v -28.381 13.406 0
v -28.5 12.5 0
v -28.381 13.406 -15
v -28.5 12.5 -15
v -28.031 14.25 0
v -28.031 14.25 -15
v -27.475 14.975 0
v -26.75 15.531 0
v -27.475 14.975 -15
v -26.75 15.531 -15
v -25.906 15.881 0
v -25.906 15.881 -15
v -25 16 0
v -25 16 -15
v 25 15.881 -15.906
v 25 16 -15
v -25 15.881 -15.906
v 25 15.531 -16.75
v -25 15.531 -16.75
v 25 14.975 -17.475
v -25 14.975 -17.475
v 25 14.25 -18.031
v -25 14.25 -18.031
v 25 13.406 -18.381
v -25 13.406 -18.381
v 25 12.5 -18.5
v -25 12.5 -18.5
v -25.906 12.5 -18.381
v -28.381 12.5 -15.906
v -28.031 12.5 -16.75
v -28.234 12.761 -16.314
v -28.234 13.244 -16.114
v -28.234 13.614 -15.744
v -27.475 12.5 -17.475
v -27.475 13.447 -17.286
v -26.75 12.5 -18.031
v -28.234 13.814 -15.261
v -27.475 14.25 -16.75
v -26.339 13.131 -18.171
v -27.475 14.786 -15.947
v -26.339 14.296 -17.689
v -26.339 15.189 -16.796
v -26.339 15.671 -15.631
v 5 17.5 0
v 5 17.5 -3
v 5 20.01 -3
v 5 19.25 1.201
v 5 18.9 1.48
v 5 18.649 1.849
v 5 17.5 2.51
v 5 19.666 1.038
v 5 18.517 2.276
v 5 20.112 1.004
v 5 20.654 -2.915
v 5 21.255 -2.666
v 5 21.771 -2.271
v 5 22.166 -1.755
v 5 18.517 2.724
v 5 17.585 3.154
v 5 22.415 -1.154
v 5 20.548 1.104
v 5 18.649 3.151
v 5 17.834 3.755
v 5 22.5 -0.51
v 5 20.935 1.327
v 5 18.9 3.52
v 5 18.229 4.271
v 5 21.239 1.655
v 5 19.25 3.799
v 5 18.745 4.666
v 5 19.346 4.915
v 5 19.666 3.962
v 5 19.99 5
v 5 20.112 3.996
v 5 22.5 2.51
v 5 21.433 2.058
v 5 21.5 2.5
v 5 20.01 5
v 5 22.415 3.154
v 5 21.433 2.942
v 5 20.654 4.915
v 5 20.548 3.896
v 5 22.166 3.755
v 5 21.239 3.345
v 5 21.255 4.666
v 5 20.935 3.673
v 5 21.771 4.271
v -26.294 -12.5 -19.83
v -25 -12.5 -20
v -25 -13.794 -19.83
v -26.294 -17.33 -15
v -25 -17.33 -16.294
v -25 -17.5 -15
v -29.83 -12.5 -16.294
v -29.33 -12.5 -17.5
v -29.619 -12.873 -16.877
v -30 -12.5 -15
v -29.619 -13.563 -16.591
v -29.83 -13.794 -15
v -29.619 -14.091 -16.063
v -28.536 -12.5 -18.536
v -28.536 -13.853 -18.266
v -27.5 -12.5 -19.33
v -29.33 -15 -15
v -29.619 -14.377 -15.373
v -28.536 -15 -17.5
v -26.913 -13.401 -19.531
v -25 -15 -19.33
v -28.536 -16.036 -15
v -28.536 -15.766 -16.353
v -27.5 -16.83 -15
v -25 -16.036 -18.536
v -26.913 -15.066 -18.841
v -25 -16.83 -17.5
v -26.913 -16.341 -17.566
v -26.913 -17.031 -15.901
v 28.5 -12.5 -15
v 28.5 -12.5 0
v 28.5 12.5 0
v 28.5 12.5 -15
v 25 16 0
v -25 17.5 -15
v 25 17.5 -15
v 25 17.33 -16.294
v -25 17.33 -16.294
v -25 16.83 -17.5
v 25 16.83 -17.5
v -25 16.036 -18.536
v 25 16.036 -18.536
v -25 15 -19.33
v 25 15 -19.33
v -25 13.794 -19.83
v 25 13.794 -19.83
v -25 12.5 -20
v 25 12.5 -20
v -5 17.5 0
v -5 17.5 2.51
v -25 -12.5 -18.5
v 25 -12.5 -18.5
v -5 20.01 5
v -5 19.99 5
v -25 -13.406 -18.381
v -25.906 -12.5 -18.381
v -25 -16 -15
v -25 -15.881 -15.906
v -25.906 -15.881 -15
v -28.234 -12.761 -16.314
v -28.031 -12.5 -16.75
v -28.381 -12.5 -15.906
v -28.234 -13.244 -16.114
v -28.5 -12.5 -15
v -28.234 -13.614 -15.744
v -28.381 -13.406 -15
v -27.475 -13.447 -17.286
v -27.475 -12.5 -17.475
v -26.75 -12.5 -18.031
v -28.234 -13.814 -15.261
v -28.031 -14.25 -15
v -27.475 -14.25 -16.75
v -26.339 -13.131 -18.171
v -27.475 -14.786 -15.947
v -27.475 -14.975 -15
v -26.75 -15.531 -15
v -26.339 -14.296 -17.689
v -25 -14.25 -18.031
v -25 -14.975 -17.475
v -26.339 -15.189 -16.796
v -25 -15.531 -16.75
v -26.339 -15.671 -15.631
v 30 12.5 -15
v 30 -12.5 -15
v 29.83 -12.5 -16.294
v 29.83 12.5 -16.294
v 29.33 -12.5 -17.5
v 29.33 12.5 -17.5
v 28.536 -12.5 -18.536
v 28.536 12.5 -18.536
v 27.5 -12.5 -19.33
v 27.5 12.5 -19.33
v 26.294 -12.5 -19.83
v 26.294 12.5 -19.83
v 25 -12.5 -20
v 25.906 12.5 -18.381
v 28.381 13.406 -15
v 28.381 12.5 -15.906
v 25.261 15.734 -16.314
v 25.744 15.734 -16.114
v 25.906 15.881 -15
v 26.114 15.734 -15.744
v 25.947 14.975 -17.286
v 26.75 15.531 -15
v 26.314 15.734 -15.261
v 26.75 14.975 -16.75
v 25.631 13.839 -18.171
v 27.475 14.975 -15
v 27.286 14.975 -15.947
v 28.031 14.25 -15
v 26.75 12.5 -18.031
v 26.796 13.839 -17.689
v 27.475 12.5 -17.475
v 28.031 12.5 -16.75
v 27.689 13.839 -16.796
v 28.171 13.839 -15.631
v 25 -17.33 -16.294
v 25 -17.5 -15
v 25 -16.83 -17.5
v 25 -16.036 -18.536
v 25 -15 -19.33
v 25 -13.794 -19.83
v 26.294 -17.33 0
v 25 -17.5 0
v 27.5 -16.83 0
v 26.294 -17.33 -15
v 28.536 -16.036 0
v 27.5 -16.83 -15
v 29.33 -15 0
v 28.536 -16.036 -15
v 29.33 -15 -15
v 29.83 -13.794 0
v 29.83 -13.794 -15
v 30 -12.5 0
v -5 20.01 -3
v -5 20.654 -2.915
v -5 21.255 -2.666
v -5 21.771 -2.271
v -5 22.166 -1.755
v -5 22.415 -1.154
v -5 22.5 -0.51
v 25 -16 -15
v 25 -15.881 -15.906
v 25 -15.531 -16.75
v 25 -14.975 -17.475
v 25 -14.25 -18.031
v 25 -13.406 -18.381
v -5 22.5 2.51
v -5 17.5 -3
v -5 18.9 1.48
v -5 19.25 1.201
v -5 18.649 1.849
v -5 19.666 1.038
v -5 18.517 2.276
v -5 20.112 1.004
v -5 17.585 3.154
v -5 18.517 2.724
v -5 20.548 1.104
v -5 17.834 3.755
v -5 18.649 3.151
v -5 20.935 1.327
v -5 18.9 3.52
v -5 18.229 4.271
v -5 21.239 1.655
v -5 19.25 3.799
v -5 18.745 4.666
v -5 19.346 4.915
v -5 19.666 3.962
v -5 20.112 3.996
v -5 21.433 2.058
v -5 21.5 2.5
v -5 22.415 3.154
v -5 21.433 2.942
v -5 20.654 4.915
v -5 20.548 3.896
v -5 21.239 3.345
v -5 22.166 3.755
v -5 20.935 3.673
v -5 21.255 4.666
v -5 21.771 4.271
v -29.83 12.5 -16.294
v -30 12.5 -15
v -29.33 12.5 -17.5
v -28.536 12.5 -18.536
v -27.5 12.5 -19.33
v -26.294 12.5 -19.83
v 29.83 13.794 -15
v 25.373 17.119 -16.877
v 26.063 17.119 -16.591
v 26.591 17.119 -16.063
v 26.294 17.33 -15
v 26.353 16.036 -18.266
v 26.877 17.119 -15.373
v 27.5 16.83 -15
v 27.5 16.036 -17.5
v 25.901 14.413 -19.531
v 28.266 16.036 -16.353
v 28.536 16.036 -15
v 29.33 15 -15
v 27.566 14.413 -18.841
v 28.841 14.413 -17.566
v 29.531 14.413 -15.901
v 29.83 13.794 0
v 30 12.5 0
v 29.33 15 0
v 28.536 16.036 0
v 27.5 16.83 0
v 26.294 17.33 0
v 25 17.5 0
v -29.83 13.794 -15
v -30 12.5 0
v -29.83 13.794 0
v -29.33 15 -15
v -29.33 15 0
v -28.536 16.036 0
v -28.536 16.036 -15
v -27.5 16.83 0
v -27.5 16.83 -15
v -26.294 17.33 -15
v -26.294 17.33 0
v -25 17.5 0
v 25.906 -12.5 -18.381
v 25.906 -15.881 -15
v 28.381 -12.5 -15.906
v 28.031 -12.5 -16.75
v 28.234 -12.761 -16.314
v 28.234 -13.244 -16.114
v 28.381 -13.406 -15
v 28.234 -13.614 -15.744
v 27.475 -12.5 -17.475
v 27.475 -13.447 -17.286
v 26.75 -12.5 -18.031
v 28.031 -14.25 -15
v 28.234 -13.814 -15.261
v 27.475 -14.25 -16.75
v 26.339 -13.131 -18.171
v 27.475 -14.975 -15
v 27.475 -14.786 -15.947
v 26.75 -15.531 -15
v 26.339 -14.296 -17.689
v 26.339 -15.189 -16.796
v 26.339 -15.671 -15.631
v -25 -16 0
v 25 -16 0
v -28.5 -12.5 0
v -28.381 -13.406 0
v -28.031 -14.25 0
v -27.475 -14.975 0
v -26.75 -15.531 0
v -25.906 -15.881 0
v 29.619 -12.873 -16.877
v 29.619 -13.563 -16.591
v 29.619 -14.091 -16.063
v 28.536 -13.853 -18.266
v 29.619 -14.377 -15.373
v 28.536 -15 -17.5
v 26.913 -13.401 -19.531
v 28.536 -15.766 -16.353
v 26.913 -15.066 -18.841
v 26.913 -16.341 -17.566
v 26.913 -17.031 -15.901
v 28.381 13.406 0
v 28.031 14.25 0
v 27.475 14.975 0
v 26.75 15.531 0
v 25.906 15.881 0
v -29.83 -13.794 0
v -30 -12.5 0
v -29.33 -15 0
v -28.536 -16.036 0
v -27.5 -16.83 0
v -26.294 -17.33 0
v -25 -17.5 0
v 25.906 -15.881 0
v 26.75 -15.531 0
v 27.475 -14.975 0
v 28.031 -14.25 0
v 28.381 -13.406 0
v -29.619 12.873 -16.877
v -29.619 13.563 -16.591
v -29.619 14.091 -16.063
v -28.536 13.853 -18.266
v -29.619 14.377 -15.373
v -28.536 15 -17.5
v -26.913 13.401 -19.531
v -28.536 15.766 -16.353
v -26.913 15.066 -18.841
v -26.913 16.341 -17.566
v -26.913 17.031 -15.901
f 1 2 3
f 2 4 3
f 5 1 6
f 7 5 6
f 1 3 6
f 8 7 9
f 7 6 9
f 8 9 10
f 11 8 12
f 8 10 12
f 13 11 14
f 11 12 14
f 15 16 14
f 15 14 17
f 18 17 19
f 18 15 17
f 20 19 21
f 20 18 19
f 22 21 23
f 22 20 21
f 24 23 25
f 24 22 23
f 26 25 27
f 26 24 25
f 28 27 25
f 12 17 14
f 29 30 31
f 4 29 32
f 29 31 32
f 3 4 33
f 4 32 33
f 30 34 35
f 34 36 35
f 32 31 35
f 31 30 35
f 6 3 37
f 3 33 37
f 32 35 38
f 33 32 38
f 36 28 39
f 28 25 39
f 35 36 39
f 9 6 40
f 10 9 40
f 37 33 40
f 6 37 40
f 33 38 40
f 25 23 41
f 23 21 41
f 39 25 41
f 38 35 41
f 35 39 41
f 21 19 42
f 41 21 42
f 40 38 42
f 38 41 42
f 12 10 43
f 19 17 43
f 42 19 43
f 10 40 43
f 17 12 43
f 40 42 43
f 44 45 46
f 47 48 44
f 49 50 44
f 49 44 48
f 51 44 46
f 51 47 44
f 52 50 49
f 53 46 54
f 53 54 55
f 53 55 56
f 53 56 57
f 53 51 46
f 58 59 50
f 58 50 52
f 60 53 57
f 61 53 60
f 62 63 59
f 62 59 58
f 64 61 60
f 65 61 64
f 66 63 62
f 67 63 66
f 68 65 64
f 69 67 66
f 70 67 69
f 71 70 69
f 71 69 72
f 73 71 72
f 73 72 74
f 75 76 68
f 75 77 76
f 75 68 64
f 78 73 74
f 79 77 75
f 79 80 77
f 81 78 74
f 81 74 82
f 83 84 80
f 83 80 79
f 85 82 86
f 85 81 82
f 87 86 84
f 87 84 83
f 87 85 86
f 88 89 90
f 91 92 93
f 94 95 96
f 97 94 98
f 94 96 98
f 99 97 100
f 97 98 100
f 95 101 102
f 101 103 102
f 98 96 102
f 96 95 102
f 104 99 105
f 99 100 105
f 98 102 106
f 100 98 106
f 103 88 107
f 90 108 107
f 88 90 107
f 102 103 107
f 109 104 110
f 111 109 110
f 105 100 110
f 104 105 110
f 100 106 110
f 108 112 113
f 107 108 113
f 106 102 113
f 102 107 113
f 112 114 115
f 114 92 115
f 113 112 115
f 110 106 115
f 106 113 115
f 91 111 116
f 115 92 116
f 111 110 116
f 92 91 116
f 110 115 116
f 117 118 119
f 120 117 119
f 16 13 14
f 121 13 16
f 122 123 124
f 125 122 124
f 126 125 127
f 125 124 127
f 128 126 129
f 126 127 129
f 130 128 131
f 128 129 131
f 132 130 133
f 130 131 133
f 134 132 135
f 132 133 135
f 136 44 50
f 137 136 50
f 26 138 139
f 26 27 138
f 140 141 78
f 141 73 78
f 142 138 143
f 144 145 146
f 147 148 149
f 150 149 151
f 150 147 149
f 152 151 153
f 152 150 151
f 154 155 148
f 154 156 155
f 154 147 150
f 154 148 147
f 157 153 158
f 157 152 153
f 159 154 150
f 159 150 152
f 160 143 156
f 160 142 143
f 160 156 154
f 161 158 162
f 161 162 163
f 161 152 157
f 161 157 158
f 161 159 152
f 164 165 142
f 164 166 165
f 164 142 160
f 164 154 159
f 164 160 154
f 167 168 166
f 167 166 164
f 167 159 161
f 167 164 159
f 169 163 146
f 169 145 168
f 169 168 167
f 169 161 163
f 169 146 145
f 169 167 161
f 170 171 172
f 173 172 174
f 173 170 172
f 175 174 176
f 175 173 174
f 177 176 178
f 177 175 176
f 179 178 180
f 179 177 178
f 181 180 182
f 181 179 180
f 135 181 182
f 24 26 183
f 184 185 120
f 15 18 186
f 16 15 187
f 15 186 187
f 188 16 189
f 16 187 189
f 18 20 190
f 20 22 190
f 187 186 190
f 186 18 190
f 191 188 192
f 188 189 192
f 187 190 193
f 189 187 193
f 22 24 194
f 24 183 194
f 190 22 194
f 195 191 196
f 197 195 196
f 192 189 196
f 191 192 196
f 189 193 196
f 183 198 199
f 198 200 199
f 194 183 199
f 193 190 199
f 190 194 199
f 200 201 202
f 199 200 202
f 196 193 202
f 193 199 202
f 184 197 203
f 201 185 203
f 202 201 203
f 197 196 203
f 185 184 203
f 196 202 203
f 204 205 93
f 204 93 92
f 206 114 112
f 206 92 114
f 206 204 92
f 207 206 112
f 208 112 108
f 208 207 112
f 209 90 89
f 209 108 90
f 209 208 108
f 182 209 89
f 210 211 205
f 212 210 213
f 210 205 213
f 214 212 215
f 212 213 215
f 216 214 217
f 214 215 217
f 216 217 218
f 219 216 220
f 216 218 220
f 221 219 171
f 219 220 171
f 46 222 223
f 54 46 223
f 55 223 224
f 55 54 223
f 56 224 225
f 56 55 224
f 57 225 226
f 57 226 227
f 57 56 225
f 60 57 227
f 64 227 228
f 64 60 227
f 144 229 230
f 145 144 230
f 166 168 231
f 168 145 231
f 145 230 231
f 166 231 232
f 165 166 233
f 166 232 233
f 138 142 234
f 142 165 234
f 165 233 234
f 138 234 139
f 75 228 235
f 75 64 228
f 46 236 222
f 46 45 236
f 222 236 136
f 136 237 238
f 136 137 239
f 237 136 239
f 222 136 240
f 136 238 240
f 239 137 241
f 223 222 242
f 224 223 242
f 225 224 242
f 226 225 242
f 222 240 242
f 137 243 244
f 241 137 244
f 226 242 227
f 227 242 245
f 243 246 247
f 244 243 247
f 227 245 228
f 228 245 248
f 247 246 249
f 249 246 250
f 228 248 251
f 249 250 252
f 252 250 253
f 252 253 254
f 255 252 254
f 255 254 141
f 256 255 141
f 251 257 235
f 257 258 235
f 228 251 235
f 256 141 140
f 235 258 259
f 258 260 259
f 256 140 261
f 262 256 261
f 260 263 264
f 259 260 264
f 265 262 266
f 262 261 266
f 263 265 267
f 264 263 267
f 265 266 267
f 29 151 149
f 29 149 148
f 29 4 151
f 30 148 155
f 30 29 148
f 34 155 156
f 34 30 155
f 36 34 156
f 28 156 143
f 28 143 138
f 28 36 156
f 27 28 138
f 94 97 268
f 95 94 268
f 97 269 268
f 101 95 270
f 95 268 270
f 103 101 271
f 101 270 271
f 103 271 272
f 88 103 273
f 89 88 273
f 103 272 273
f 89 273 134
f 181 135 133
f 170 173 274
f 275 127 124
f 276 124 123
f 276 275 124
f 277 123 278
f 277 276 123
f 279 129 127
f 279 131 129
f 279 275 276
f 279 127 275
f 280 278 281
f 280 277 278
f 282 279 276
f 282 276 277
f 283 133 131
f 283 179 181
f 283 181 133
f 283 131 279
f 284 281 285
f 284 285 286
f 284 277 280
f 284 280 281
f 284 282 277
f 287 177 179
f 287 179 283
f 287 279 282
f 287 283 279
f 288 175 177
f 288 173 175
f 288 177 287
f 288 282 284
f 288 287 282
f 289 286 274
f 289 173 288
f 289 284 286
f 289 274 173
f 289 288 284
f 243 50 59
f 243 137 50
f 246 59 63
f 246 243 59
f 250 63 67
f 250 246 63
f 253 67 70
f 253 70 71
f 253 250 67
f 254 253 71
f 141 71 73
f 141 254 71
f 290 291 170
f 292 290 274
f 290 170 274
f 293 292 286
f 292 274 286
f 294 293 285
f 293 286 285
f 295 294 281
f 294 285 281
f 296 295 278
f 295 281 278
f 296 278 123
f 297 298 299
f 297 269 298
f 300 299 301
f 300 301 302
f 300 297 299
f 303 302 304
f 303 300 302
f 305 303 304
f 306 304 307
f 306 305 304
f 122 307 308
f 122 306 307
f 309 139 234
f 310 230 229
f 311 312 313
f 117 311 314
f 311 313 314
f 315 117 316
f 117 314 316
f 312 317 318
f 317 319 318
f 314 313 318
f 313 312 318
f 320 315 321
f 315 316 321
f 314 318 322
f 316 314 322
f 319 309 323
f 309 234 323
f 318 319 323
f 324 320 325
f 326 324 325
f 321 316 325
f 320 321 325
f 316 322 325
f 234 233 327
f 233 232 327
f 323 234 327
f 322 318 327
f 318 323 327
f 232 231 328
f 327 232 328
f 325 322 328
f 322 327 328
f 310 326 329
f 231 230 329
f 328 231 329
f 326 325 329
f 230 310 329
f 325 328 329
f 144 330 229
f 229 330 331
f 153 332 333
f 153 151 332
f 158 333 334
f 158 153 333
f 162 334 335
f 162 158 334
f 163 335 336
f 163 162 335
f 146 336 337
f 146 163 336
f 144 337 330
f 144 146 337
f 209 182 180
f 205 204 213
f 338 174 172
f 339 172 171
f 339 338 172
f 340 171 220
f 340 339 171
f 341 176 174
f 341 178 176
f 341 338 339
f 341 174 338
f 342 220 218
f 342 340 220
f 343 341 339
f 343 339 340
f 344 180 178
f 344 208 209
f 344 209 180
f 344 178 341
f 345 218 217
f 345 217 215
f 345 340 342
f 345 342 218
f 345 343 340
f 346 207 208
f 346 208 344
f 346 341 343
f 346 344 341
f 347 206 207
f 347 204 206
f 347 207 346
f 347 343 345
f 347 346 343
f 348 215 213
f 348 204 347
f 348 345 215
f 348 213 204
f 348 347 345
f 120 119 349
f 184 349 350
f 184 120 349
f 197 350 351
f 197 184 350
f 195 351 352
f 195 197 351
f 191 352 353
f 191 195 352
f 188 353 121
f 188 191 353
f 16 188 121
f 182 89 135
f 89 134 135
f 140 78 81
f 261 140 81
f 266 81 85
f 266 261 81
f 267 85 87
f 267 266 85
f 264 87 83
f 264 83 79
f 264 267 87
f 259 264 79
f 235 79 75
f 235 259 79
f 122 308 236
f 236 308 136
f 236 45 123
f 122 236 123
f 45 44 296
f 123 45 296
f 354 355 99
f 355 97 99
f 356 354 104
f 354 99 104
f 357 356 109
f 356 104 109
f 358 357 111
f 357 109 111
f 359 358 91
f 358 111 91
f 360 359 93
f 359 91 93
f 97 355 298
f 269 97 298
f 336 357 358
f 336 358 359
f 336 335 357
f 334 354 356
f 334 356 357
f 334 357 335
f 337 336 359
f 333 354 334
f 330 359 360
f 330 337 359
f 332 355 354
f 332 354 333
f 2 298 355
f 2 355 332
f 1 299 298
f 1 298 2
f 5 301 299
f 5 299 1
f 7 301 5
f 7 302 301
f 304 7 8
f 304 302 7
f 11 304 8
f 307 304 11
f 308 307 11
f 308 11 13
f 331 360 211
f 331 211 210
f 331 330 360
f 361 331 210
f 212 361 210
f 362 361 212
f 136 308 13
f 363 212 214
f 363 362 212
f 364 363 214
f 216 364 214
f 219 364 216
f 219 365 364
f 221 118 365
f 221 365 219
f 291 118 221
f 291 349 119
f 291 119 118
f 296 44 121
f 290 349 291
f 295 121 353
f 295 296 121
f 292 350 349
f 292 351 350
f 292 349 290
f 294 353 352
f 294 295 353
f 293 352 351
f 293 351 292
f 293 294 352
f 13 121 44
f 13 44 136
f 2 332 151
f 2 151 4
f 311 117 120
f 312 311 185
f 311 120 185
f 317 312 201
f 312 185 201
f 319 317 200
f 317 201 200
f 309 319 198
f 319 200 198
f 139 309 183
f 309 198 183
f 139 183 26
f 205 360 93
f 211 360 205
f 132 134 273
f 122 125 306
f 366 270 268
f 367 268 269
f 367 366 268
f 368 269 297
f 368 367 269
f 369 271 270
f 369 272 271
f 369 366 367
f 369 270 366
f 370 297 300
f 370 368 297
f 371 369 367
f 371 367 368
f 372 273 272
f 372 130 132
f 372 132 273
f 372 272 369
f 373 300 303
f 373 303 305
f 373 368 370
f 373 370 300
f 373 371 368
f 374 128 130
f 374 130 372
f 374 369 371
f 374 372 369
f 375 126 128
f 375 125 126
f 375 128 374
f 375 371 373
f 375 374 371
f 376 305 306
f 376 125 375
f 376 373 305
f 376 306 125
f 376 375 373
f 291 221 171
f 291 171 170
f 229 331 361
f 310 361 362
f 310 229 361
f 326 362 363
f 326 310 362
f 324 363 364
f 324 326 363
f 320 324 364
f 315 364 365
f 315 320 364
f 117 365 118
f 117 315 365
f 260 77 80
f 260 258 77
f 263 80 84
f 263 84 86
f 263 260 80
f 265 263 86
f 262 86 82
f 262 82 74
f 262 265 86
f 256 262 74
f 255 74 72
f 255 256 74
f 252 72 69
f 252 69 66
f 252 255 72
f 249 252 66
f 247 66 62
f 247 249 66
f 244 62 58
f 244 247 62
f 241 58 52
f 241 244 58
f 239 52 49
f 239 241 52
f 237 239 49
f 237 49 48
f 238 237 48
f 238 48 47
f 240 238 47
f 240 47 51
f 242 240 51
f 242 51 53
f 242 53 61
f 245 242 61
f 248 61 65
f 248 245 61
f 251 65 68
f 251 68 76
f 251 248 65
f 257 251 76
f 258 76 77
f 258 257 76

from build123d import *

# Parameters (mm, degrees)
SKETCH_W     = 60
SKETCH_H     = 35
PAD_DEPTH    = 20
FILLET_R     = 5
THICKNESS_T  = -1.5
SKETCH001_W  = 5
SKETCH001_H  = 8
SKETCH001_R  = 1.5
PAD001_DEPTH = 5
FILLET001_R  = 2.49


with BuildPart() as part:
    # Sketch → Pad (new body)
    with BuildSketch(Plane.XY):
        Rectangle(SKETCH_W, SKETCH_H)
    extrude(amount=-PAD_DEPTH)

    # Fillet
    fillet_edges = [part.edges().sort_by_distance(p)[0] for p in [
        (0, -17.5, -20),
        (30, 0, -20),
        (0, 17.5, -20),
        (-30, 0, -20),
        (30, 17.5, -10),
        (30, -17.5, -10),
        (-30, 17.5, -10),
        (-30, -17.5, -10),
    ]]
    fillet(fillet_edges, radius=FILLET_R)

    # Thickness
    thickness_openings = [part.faces().sort_by_distance(p)[0] for p in [
        (0, 0, 0),
    ]]
    offset(amount=THICKNESS_T, openings=thickness_openings)

    # Sketch001 → Pad001 (join, symmetric)
    with BuildSketch(Plane.YZ):
        with Locations((20, 1)):
            Rectangle(SKETCH001_W, SKETCH001_H)
        with Locations((20, 2.5)):
            Circle(SKETCH001_R, mode=Mode.SUBTRACT)
    extrude(amount=PAD001_DEPTH, both=True)

    # Fillet001
    fillet001_edges = [part.edges().sort_by_distance(p)[0] for p in [
        (0, 22.5, 5),
        (0, 17.5, 5),
        (0, 22.5, -3),
    ]]
    fillet(fillet001_edges, radius=FILLET001_R)


solid = part.part
